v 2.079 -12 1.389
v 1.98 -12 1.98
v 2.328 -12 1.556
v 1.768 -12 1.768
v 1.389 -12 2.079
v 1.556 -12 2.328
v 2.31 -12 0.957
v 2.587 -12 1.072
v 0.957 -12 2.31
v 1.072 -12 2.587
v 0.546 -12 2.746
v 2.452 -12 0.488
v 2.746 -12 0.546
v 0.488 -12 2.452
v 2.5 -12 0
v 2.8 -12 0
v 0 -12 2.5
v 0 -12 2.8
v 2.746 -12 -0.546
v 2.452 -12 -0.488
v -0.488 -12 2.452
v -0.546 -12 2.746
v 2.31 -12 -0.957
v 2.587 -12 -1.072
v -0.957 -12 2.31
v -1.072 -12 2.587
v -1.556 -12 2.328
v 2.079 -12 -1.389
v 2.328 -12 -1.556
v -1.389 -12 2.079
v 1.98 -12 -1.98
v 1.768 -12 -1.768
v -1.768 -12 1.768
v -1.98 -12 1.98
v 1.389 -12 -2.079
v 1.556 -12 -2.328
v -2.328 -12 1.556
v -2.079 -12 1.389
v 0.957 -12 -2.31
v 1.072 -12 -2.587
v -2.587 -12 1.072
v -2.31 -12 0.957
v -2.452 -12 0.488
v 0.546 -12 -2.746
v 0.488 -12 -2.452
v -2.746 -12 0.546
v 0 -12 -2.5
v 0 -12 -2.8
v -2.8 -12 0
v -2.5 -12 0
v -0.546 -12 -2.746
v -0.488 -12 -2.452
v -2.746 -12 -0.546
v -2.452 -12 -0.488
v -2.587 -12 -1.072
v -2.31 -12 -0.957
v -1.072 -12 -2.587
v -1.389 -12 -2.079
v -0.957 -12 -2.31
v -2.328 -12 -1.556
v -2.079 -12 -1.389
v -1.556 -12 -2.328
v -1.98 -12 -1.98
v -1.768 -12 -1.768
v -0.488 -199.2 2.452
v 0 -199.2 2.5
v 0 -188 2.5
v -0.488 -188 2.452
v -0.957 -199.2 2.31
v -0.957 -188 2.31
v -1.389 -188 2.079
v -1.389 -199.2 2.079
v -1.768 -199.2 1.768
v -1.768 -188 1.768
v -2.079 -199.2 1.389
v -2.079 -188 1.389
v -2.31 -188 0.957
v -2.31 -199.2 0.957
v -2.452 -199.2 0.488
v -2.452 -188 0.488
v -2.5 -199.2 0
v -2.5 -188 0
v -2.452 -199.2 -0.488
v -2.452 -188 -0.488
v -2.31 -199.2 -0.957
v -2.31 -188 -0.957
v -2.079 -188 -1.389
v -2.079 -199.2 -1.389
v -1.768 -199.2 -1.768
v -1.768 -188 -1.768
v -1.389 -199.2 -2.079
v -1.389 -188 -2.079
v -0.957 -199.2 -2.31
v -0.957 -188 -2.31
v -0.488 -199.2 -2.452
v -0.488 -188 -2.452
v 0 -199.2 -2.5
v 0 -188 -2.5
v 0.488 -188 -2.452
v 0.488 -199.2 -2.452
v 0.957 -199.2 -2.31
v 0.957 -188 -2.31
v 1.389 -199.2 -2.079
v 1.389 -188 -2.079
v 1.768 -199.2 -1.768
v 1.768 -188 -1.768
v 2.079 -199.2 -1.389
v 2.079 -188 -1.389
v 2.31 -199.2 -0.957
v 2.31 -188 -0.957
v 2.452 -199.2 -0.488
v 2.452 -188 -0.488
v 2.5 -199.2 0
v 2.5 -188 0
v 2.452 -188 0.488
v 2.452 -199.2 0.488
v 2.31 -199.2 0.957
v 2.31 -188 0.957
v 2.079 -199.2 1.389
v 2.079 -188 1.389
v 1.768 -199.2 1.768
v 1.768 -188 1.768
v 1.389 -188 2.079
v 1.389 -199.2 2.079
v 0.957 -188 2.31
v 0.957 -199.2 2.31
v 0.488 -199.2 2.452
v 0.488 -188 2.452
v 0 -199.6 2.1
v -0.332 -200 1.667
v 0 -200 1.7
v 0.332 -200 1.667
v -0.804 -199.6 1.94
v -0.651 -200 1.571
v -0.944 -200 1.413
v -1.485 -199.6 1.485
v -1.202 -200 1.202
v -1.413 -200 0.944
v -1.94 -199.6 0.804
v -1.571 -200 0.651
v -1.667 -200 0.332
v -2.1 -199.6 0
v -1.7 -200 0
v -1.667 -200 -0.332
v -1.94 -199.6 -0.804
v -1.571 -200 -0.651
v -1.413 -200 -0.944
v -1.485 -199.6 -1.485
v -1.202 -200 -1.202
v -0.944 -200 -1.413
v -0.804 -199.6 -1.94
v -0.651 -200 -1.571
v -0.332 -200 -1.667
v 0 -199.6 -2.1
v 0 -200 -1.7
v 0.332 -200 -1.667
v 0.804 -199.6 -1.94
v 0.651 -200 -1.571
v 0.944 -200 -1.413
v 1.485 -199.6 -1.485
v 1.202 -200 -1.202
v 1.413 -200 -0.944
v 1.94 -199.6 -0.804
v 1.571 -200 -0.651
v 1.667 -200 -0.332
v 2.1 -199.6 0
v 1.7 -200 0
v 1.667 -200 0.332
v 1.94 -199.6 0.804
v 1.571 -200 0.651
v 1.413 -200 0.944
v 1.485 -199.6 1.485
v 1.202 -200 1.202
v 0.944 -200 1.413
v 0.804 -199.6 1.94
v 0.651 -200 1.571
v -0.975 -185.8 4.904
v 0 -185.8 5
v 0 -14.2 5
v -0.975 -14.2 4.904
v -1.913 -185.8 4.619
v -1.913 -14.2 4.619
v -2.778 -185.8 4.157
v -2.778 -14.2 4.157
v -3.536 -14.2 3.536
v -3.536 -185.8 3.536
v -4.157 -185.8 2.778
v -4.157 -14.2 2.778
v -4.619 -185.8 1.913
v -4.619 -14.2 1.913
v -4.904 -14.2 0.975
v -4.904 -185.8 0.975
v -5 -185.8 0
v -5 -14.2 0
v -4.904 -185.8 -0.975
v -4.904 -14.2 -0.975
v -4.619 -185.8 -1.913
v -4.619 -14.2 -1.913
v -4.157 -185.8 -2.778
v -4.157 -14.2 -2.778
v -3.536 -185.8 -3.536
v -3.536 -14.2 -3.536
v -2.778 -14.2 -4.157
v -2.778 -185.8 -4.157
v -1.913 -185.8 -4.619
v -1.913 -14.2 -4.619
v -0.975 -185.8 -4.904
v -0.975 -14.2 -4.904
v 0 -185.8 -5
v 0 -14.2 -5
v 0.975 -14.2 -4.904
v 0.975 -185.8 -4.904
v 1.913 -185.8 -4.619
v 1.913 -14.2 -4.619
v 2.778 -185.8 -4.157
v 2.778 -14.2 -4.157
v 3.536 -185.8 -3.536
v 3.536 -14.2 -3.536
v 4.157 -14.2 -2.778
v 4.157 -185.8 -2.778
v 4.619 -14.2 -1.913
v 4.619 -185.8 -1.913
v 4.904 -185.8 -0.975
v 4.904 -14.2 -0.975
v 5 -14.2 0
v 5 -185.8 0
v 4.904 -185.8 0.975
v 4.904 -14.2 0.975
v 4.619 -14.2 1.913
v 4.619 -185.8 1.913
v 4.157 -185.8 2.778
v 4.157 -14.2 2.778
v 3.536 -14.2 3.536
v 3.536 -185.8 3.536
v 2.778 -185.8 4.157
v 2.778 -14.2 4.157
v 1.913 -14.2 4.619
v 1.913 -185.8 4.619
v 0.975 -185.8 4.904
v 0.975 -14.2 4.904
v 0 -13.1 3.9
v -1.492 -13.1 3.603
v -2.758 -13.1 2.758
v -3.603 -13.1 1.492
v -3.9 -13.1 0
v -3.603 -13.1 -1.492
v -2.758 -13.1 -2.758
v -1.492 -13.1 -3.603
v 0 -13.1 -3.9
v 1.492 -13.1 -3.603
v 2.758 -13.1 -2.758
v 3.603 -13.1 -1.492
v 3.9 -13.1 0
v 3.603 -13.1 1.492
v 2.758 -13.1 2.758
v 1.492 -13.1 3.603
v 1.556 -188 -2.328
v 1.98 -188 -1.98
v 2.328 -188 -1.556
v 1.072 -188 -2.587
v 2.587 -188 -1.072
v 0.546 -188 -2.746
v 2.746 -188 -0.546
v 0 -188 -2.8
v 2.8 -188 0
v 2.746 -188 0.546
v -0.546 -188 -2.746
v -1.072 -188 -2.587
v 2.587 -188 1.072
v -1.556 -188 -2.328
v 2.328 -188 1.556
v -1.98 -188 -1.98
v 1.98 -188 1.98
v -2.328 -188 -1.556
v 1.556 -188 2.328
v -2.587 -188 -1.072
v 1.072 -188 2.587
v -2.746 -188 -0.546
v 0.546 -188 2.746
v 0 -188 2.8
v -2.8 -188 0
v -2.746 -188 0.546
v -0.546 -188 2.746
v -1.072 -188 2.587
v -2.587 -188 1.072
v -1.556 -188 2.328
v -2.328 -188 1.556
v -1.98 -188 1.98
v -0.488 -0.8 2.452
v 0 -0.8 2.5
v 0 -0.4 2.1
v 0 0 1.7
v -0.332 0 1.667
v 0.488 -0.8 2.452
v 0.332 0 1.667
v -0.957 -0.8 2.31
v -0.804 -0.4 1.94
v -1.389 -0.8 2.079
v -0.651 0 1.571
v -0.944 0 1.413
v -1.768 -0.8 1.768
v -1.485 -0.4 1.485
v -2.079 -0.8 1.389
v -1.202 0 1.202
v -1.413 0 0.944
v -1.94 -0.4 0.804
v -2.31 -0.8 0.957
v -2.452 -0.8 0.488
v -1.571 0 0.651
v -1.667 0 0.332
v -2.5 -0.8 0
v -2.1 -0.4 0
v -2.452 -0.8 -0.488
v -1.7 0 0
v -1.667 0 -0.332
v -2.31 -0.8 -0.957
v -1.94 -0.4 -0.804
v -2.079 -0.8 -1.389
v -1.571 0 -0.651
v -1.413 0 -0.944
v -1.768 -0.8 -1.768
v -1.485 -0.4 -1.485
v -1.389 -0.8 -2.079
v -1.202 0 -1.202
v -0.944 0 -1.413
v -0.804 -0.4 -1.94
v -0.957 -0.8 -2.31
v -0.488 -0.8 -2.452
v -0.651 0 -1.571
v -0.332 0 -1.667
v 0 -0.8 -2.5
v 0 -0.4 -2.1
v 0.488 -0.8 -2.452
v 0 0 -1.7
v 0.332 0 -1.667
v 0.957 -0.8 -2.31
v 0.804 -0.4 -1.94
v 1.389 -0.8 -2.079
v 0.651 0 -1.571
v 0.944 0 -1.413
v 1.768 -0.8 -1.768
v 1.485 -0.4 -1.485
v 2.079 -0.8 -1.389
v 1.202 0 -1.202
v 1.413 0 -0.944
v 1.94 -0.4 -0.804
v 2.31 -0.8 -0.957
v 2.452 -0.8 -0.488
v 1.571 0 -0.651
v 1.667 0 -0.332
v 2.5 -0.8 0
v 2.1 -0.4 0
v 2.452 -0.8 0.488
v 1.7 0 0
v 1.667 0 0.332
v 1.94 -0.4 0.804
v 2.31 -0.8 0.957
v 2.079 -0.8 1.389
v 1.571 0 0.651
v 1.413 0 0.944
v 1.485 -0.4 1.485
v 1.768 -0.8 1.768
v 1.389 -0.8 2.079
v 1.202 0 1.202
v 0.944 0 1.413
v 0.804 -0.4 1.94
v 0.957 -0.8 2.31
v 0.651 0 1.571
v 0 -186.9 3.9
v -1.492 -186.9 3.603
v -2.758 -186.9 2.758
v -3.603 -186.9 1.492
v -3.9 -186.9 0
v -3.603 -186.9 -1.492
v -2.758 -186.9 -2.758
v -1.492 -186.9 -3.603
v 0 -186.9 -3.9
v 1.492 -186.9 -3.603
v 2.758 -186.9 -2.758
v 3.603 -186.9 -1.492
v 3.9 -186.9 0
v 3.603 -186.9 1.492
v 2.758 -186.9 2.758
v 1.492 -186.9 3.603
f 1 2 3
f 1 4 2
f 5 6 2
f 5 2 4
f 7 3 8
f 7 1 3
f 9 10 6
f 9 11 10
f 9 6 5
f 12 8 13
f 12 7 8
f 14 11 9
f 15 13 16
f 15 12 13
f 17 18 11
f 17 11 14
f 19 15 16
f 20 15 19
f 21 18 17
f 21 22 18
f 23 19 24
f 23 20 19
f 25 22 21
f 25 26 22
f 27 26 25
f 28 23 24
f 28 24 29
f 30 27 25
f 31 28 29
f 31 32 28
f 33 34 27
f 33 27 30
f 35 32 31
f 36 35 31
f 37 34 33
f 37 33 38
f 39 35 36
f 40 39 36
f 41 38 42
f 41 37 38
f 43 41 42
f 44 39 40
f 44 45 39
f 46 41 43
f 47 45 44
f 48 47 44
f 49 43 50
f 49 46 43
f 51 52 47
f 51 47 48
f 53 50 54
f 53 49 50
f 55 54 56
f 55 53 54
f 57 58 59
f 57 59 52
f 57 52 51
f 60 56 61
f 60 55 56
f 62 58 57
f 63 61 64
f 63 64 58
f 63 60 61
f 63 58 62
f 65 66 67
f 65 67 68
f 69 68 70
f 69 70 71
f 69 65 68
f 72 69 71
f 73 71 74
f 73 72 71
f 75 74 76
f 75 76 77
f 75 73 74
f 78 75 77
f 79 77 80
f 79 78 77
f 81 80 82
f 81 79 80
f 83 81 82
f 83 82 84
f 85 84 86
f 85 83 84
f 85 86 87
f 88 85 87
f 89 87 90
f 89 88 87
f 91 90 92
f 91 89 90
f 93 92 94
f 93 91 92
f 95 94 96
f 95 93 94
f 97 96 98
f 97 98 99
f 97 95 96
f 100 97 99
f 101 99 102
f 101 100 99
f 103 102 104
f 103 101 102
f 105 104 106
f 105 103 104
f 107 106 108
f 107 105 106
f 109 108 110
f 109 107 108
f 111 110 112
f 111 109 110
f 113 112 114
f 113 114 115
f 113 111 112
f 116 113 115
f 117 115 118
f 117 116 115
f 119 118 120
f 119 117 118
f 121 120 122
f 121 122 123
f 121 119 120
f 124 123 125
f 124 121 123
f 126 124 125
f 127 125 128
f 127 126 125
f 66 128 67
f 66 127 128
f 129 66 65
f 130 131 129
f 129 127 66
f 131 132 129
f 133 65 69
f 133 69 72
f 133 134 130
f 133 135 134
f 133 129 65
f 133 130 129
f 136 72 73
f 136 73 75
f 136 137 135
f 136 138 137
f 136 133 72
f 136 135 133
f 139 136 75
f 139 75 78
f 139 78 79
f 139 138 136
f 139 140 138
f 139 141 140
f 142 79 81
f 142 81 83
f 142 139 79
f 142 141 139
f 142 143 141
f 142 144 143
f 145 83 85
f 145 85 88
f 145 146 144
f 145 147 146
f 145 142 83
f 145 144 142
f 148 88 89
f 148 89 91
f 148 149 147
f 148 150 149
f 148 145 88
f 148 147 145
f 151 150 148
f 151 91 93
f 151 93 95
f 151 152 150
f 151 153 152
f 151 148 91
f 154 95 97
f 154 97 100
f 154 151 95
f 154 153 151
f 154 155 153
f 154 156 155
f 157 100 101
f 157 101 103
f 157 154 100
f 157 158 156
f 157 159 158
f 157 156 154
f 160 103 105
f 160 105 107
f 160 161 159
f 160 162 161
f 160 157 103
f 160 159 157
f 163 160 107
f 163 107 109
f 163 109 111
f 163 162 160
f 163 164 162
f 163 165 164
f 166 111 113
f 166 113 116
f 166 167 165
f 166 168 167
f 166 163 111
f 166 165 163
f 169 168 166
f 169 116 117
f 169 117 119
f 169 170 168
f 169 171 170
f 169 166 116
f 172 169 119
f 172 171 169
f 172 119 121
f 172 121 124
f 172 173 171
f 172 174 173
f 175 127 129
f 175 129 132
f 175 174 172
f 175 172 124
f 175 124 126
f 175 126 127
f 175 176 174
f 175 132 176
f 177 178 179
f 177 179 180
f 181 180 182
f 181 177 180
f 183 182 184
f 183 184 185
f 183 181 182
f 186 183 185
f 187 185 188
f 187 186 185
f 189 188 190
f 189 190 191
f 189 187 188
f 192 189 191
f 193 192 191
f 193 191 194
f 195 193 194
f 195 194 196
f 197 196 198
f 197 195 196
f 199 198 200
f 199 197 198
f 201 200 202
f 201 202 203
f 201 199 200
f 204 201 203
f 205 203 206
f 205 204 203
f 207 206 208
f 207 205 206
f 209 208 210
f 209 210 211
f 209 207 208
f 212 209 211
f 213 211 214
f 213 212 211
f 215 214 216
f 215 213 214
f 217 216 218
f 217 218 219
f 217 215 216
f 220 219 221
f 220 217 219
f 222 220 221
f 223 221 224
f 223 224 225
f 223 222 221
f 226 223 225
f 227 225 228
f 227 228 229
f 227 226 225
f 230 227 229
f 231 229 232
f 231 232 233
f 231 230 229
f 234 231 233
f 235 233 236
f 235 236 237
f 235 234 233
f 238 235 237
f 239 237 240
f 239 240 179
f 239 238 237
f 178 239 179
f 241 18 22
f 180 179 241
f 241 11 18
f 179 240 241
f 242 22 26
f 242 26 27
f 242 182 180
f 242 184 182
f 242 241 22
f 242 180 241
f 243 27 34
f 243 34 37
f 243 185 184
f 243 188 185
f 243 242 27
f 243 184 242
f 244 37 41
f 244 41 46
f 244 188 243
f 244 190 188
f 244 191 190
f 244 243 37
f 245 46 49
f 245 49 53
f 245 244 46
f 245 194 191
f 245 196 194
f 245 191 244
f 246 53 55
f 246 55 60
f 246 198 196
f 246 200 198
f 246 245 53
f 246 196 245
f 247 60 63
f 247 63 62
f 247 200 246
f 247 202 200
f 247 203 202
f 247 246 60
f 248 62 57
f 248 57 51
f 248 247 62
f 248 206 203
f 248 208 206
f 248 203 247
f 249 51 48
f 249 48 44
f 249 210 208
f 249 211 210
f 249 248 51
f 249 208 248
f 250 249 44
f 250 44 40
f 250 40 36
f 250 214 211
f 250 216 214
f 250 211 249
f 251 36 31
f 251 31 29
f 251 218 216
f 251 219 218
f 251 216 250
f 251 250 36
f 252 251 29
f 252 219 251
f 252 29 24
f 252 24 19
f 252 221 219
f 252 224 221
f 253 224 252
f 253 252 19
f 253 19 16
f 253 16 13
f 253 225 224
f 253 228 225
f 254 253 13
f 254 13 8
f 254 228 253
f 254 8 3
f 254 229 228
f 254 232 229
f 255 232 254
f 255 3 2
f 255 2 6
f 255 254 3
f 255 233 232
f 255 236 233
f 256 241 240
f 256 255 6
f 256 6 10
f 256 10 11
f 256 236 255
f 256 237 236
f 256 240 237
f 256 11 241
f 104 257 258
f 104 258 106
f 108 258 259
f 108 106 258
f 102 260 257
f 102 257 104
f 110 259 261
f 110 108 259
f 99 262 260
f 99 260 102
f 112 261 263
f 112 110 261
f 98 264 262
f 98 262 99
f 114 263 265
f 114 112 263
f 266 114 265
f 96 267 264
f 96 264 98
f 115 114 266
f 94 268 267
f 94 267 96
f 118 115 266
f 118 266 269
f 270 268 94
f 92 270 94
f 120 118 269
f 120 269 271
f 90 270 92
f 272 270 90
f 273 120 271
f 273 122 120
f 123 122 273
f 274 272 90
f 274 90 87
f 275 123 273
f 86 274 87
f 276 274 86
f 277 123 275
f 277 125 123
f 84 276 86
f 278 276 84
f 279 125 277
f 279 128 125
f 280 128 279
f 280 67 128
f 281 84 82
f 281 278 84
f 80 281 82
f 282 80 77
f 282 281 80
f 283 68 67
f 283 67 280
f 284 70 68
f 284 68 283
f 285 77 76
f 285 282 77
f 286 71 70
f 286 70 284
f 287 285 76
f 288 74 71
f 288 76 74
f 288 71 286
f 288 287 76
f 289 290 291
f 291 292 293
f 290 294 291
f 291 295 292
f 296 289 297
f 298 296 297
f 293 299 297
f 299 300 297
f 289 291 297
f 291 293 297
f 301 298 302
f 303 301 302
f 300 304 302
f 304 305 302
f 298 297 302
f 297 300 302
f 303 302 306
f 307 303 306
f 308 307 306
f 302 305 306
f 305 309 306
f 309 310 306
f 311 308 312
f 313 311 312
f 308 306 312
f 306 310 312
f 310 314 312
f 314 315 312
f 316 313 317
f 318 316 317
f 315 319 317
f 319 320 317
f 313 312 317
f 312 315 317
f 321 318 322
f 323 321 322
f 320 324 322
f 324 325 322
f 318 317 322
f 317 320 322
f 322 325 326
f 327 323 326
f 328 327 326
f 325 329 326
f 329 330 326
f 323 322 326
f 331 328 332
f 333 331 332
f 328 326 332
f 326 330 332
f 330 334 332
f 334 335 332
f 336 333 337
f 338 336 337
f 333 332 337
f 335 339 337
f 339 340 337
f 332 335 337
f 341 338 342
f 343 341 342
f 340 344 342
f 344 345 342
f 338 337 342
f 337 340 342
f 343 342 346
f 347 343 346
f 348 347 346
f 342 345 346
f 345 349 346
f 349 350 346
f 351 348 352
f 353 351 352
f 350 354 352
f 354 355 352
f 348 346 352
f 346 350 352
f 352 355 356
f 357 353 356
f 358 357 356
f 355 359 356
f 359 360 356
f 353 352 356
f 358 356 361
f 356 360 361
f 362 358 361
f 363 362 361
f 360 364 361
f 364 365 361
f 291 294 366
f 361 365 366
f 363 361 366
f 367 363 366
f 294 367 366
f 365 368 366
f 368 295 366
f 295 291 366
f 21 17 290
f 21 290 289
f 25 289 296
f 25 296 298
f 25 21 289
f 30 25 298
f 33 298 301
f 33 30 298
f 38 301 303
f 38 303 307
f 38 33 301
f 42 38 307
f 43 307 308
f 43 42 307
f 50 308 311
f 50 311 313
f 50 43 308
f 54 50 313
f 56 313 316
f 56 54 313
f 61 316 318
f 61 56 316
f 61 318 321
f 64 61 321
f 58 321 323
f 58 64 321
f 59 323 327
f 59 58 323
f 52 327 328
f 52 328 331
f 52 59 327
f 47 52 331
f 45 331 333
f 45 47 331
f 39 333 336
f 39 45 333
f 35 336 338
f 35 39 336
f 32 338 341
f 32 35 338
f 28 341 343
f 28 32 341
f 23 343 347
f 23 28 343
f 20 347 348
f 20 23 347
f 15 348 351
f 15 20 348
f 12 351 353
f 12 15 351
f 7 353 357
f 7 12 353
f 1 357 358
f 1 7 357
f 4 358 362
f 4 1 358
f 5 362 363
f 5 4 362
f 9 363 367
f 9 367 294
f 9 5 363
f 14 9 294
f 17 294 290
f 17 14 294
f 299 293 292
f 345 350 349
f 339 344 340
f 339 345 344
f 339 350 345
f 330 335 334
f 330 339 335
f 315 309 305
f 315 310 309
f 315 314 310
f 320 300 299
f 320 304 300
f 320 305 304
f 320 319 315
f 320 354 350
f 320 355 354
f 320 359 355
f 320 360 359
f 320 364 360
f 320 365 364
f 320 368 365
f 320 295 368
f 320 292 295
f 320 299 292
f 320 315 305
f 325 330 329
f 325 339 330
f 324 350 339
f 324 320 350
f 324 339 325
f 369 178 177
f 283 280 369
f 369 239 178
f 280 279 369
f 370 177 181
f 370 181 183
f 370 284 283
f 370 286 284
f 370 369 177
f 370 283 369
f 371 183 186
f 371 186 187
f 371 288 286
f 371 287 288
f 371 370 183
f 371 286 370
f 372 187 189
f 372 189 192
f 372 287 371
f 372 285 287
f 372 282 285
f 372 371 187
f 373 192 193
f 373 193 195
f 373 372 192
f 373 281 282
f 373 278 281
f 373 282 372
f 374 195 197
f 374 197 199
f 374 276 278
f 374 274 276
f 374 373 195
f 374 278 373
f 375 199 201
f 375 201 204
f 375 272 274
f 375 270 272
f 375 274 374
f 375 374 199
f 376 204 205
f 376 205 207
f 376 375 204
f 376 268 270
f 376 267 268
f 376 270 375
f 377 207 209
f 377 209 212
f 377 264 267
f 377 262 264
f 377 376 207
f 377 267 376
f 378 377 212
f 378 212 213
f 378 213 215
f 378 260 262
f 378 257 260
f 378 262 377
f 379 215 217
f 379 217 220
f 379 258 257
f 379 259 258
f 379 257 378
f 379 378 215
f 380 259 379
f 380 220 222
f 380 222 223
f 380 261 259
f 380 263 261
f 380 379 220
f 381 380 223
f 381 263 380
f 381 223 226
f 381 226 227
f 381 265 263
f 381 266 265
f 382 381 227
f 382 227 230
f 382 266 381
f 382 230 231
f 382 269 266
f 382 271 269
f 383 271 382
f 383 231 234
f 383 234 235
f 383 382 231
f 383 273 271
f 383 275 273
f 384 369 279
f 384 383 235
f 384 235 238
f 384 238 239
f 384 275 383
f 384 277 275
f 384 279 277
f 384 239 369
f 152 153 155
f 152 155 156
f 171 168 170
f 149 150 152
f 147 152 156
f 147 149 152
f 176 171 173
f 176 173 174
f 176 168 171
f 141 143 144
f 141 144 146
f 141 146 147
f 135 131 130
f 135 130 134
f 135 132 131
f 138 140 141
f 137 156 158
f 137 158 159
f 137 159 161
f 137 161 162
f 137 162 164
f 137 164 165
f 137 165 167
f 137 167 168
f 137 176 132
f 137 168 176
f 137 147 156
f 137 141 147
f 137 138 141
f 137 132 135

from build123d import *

# Parameters (mm, degrees)
FASE1_SIZE = 2.2
FASE2_SIZE = 0.8


with BuildPart() as part:
    # Skizze1 → Rotation1 (revolve)
    with BuildSketch(Plane.XY, mode=Mode.PRIVATE) as rotation1_sk:
        Polygon((0, 0), (2.5, 0), (2.5, -12), (5, -12), (5, -188), (2.5, -188), (2.5, -200), (0, -200), align=None)
    revolve(rotation1_sk.sketch.rotate(Axis((0, 0, 0), (0, -1, 0)), 90), axis=Axis((0, 0, 0), (0, -1, 0)))

    # Fase1
    fase1_edges = [part.edges().sort_by_distance(p)[0] for p in [
        (0, -188, -5),
        (0, -12, -5),
    ]]
    chamfer(fase1_edges, length=FASE1_SIZE)

    # Fase2
    fase2_edges = [part.edges().sort_by_distance(p)[0] for p in [
        (0, -200, -2.5),
        (0, 0, -2.5),
    ]]
    chamfer(fase2_edges, length=FASE2_SIZE)


solid = part.part
